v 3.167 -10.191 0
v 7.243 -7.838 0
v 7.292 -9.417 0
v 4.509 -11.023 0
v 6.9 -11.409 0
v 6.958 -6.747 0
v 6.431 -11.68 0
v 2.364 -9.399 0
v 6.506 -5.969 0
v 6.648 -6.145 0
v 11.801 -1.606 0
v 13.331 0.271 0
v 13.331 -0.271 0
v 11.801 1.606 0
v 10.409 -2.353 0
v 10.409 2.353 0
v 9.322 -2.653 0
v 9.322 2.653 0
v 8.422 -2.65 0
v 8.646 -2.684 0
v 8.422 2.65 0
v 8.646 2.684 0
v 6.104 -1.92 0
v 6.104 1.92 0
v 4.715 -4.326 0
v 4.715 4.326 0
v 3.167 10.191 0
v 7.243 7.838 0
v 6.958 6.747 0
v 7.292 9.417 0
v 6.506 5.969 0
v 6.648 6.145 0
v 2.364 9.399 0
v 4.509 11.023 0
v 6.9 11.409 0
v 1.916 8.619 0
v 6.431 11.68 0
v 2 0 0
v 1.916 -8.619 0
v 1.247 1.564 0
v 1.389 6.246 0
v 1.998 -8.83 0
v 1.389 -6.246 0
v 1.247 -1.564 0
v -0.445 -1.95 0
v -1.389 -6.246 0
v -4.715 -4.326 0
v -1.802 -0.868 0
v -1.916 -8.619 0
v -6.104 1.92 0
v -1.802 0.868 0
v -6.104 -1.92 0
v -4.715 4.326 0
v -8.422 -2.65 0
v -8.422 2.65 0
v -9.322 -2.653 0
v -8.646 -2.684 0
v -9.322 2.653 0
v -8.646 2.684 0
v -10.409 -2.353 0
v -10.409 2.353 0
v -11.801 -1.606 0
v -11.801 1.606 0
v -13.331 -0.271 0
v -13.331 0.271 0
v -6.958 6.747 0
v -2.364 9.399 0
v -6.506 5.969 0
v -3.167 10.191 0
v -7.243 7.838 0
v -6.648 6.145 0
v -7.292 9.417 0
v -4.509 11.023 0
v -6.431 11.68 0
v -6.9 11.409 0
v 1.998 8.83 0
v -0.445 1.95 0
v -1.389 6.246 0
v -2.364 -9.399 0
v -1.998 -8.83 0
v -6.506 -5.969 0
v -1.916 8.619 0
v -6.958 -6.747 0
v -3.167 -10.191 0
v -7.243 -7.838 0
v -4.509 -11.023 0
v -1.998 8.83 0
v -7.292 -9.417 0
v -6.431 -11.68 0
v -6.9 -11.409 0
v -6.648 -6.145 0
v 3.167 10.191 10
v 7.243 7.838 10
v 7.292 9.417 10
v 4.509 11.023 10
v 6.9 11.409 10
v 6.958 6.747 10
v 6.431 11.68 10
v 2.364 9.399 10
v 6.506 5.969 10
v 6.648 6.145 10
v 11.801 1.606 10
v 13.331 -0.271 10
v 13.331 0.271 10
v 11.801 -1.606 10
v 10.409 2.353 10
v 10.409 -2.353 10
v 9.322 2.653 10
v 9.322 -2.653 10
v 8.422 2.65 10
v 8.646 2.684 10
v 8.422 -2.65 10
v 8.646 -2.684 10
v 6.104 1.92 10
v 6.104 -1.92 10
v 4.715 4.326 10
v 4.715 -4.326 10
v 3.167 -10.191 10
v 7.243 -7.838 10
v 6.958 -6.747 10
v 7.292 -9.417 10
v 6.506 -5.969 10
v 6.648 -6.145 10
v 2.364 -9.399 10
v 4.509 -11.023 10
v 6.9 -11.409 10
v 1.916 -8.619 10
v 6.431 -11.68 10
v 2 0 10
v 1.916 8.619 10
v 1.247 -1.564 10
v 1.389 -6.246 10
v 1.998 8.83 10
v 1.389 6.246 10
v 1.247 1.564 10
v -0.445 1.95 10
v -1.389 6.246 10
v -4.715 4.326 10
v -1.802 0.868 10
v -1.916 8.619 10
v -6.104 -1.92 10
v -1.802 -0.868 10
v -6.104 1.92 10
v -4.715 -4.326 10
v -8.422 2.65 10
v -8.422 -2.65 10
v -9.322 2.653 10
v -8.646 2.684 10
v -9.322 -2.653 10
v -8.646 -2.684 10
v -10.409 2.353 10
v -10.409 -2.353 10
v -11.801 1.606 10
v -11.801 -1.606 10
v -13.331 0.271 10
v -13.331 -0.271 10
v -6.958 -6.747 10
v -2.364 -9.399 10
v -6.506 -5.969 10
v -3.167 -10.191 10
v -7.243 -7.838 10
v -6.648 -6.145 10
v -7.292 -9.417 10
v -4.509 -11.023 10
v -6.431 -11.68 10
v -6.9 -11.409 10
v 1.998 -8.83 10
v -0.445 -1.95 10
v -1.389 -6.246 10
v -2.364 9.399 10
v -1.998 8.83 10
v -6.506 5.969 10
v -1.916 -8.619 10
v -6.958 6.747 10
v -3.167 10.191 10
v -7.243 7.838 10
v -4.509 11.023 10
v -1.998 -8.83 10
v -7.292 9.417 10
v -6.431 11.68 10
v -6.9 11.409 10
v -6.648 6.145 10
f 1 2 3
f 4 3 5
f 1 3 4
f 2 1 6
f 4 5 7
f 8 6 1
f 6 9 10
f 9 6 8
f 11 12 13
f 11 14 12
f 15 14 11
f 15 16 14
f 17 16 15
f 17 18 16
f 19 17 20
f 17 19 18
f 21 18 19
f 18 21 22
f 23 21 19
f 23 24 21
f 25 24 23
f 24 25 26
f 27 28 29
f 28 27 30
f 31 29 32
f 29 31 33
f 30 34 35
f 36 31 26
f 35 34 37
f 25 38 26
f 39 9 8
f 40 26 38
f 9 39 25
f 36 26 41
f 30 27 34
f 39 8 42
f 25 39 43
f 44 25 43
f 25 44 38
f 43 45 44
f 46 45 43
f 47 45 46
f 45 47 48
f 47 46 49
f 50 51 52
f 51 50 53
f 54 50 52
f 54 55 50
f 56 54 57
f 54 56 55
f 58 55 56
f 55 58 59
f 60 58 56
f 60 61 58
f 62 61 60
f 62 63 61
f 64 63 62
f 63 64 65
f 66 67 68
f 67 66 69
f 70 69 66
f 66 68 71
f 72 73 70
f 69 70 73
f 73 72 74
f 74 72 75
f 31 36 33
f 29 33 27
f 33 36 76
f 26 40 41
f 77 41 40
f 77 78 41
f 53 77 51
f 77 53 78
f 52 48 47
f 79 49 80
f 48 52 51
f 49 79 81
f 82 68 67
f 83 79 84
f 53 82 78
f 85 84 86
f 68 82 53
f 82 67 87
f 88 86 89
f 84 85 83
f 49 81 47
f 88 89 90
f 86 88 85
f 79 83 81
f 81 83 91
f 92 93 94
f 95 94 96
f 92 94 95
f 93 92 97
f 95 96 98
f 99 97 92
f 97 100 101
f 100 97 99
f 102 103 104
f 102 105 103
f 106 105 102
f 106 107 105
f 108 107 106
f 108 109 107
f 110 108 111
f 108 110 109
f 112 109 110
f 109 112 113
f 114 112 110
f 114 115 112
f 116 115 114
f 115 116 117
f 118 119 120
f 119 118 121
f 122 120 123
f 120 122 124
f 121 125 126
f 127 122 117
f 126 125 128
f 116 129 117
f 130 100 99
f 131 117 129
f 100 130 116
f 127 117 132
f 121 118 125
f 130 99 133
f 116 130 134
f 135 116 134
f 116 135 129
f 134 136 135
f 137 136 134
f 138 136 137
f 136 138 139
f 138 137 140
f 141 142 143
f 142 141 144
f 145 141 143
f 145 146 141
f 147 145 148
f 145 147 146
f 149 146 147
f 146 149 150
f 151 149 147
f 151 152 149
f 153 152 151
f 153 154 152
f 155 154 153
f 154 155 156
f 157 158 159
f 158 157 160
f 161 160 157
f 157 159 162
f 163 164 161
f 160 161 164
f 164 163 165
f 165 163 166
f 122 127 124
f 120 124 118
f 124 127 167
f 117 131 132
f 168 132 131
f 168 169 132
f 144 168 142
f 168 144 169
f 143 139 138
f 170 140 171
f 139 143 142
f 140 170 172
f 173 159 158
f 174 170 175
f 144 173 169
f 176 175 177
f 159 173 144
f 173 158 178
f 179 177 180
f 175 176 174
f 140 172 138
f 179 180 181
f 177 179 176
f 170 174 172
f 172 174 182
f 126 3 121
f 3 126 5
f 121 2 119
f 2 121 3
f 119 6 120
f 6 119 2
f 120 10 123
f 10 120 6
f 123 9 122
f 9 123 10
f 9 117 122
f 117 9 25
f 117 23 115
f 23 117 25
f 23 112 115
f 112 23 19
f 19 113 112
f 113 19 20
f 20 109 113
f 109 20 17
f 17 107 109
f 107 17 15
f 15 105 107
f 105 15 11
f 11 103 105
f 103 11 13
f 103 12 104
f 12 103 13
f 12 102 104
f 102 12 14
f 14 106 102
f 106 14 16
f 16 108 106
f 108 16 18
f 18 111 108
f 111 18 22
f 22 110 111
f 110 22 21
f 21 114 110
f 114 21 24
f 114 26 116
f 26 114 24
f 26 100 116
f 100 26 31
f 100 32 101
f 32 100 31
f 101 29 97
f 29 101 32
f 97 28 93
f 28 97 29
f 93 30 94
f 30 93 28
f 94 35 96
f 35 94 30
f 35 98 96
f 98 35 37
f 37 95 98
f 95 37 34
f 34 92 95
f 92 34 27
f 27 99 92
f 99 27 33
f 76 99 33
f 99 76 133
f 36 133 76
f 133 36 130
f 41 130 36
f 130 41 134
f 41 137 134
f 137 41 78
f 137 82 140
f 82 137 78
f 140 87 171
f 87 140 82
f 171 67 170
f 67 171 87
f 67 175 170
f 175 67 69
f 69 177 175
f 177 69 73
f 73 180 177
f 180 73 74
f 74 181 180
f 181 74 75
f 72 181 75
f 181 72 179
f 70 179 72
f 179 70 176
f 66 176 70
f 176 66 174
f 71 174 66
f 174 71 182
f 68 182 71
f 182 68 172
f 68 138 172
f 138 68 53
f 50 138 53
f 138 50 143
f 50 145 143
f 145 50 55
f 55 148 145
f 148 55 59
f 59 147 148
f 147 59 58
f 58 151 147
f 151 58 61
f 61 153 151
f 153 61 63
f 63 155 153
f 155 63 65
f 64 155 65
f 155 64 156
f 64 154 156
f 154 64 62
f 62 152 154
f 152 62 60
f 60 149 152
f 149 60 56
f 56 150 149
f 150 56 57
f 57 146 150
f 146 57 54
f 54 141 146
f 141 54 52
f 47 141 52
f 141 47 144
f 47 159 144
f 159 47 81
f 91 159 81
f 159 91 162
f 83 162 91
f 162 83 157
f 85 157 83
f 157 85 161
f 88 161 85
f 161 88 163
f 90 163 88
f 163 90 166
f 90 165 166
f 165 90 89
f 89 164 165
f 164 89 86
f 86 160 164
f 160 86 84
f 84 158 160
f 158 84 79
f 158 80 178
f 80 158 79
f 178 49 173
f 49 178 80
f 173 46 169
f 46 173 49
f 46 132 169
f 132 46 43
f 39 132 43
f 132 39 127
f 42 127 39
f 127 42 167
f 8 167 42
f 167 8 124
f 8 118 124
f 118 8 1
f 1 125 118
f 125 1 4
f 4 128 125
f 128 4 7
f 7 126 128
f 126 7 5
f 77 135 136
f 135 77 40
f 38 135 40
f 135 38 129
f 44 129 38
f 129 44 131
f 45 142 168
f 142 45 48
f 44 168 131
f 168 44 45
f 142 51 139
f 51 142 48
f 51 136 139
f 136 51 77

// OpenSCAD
// Parametric Involute Bevel and Spur Gears by GregFrost
// It is licensed under the Creative Commons - GNU GPL license.
// © 2010 by GregFrost
// http://www.thingiverse.com/thing:3575

// Simple Test:
//gear (circular_pitch=1000,
//	gear_thickness = 20,
//	rim_thickness = 20,
//	hub_thickness = 20,
//	circles=5);

gear (
	number_of_teeth=6,
	circular_pitch=600, diametral_pitch=false,
	pressure_angle=28,
	clearance = 0.2,
	gear_thickness=10,
	rim_thickness=10,
	rim_width=5,
	hub_thickness=10,
	hub_diameter=15,
	bore_diameter=4,
	circles=0,
	backlash=0,
	twist=0,
	involute_facets=0);

//Complex Spur Gear Test:
//test_gears ();

// Meshing Double Helix:
//meshing_double_helix ();

// Demonstrate the backlash option for Spur gears.
//test_backlash ();

// Demonstrate how to make meshing bevel gears.
//bevel_gear_pair ();

pi=3.1415926535897932384626433832795;

//==================================================
// Bevel Gears:
// Two gears with the same cone distance, circular pitch (measured at the cone distance) 
// and pressure angle will mesh.

module bevel_gear_pair (
	gear1_teeth = 41,
	gear2_teeth = 7,
	axis_angle = 90,
	outside_circular_pitch=1000)
{
	outside_pitch_radius1 = gear1_teeth * outside_circular_pitch / 360;
	outside_pitch_radius2 = gear2_teeth * outside_circular_pitch / 360;
	pitch_apex1=outside_pitch_radius2 * sin (axis_angle) + 
		(outside_pitch_radius2 * cos (axis_angle) + outside_pitch_radius1) / tan (axis_angle);
	cone_distance = sqrt (pow (pitch_apex1, 2) + pow (outside_pitch_radius1, 2));
	pitch_apex2 = sqrt (pow (cone_distance, 2) - pow (outside_pitch_radius2, 2));
	echo ("cone_distance", cone_distance);
	pitch_angle1 = asin (outside_pitch_radius1 / cone_distance);
	pitch_angle2 = asin (outside_pitch_radius2 / cone_distance);
	echo ("pitch_angle1, pitch_angle2", pitch_angle1, pitch_angle2);
	echo ("pitch_angle1 + pitch_angle2", pitch_angle1 + pitch_angle2);

	rotate([0,0,90])
	translate ([0,0,pitch_apex1+20])
	{
		translate([0,0,-pitch_apex1])
		bevel_gear (
			number_of_teeth=gear1_teeth,
			cone_distance=cone_distance,
			pressure_angle=30,
			outside_circular_pitch=outside_circular_pitch);
	
		rotate([0,-(pitch_angle1+pitch_angle2),0])
		translate([0,0,-pitch_apex2])
		bevel_gear (
			number_of_teeth=gear2_teeth,
			cone_distance=cone_distance,
			pressure_angle=30,
			outside_circular_pitch=outside_circular_pitch);
	}
}

//Bevel Gear Finishing Options:
bevel_gear_flat = 0;
bevel_gear_back_cone = 1;

module bevel_gear (
	number_of_teeth=11,
	cone_distance=100,
	face_width=20,
	outside_circular_pitch=1000,
	pressure_angle=30,
	clearance = 0.2,
	bore_diameter=5,
	gear_thickness = 15,
	backlash = 0,
	involute_facets=0,
	finish = -1)
{
	echo ("bevel_gear",
		"teeth", number_of_teeth,
		"cone distance", cone_distance,
		face_width,
		outside_circular_pitch,
		pressure_angle,
		clearance,
		bore_diameter,
		involute_facets,
		finish);

	// Pitch diameter: Diameter of pitch circle at the fat end of the gear.
	outside_pitch_diameter  =  number_of_teeth * outside_circular_pitch / 180;
	outside_pitch_radius = outside_pitch_diameter / 2;

	// The height of the pitch apex.
	pitch_apex = sqrt (pow (cone_distance, 2) - pow (outside_pitch_radius, 2));
	pitch_angle = asin (outside_pitch_radius/cone_distance);

	echo ("Num Teeth:", number_of_teeth, " Pitch Angle:", pitch_angle);

	finish = (finish != -1) ? finish : (pitch_angle < 45) ? bevel_gear_flat : bevel_gear_back_cone;

	apex_to_apex=cone_distance / cos (pitch_angle);
	back_cone_radius = apex_to_apex * sin (pitch_angle);

	// Calculate and display the pitch angle. This is needed to determine the angle to mount two meshing cone gears.

	// Base Circle for forming the involute teeth shape.
	base_radius = back_cone_radius * cos (pressure_angle);	

	// Diametrial pitch: Number of teeth per unit length.
	pitch_diametrial = number_of_teeth / outside_pitch_diameter;

	// Addendum: Radial distance from pitch circle to outside circle.
	addendum = 1 / pitch_diametrial;
	// Outer Circle
	outer_radius = back_cone_radius + addendum;

	// Dedendum: Radial distance from pitch circle to root diameter
	dedendum = addendum + clearance;
	dedendum_angle = atan (dedendum / cone_distance);
	root_angle = pitch_angle - dedendum_angle;

	root_cone_full_radius = tan (root_angle)*apex_to_apex;
	back_cone_full_radius=apex_to_apex / tan (pitch_angle);

	back_cone_end_radius = 
		outside_pitch_radius - 
		dedendum * cos (pitch_angle) - 
		gear_thickness / tan (pitch_angle);
	back_cone_descent = dedendum * sin (pitch_angle) + gear_thickness;

	// Root diameter: Diameter of bottom of tooth spaces.
	root_radius = back_cone_radius - dedendum;

	half_tooth_thickness = outside_pitch_radius * sin (360 / (4 * number_of_teeth)) - backlash / 4;
	half_thick_angle = asin (half_tooth_thickness / back_cone_radius);

	face_cone_height = apex_to_apex-face_width / cos (pitch_angle);
	face_cone_full_radius = face_cone_height / tan (pitch_angle);
	face_cone_descent = dedendum * sin (pitch_angle);
	face_cone_end_radius = 
		outside_pitch_radius -
		face_width / sin (pitch_angle) - 
		face_cone_descent / tan (pitch_angle);

	// For the bevel_gear_flat finish option, calculate the height of a cube to select the portion of the gear that includes the full pitch face.
	bevel_gear_flat_height = pitch_apex - (cone_distance - face_width) * cos (pitch_angle);

//	translate([0,0,-pitch_apex])
	difference ()
	{
		intersection ()
		{
			union()
			{
				rotate (half_thick_angle)
				translate ([0,0,pitch_apex-apex_to_apex])
				cylinder ($fn=number_of_teeth*2, r1=root_cone_full_radius,r2=0,h=apex_to_apex);
				for (i = [1:number_of_teeth])
//				for (i = [1:1])
				{
					rotate ([0,0,i*360/number_of_teeth])
					{
						involute_bevel_gear_tooth (
							back_cone_radius = back_cone_radius,
							root_radius = root_radius,
							base_radius = base_radius,
							outer_radius = outer_radius,
							pitch_apex = pitch_apex,
							cone_distance = cone_distance,
							half_thick_angle = half_thick_angle,
							involute_facets = involute_facets);
					}
				}
			}

			if (finish == bevel_gear_back_cone)
			{
				translate ([0,0,-back_cone_descent])
				cylinder (
					$fn=number_of_teeth*2, 
					r1=back_cone_end_radius,
					r2=back_cone_full_radius*2,
					h=apex_to_apex + back_cone_descent);
			}
			else
			{
				translate ([-1.5*outside_pitch_radius,-1.5*outside_pitch_radius,0])
				cube ([3*outside_pitch_radius,
					3*outside_pitch_radius,
					bevel_gear_flat_height]);
			}
		}
		
		if (finish == bevel_gear_back_cone)
		{
			translate ([0,0,-face_cone_descent])
			cylinder (
				r1=face_cone_end_radius,
				r2=face_cone_full_radius * 2,
				h=face_cone_height + face_cone_descent+pitch_apex);
		}

		translate ([0,0,pitch_apex - apex_to_apex])
		cylinder (r=bore_diameter/2,h=apex_to_apex);
	}	
}

module involute_bevel_gear_tooth (
	back_cone_radius,
	root_radius,
	base_radius,
	outer_radius,
	pitch_apex,
	cone_distance,
	half_thick_angle,
	involute_facets)
{
//	echo ("involute_bevel_gear_tooth",
//		back_cone_radius,
//		root_radius,
//		base_radius,
//		outer_radius,
//		pitch_apex,
//		cone_distance,
//		half_thick_angle);

	min_radius = max (base_radius*2,root_radius*2);

	pitch_point = 
		involute (
			base_radius*2, 
			involute_intersect_angle (base_radius*2, back_cone_radius*2));
	pitch_angle = atan2 (pitch_point[1], pitch_point[0]);
	centre_angle = pitch_angle + half_thick_angle;

	start_angle = involute_intersect_angle (base_radius*2, min_radius);
	stop_angle = involute_intersect_angle (base_radius*2, outer_radius*2);

	res=(involute_facets!=0)?involute_facets:($fn==0)?5:$fn/4;

	translate ([0,0,pitch_apex])
	rotate ([0,-atan(back_cone_radius/cone_distance),0])
	translate ([-back_cone_radius*2,0,-cone_distance*2])
	union ()
	{
		for (i=[1:res])
		{
			assign (
				point1=
					involute (base_radius*2,start_angle+(stop_angle - start_angle)*(i-1)/res),
				point2=
					involute (base_radius*2,start_angle+(stop_angle - start_angle)*(i)/res))
			{
				assign (
					side1_point1 = rotate_point (centre_angle, point1),
					side1_point2 = rotate_point (centre_angle, point2),
					side2_point1 = mirror_point (rotate_point (centre_angle, point1)),
					side2_point2 = mirror_point (rotate_point (centre_angle, point2)))
				{
					polyhedron (
						points=[
							[back_cone_radius*2+0.1,0,cone_distance*2],
							[side1_point1[0],side1_point1[1],0],
							[side1_point2[0],side1_point2[1],0],
							[side2_point2[0],side2_point2[1],0],
							[side2_point1[0],side2_point1[1],0],
							[0.1,0,0]],
						triangles=[[0,1,2],[0,2,3],[0,3,4],[0,5,1],[1,5,2],[2,5,3],[3,5,4],[0,4,5]]);
				}
			}
		}
	}
}

module gear (
	number_of_teeth=15,
	circular_pitch=false, diametral_pitch=false,
	pressure_angle=28,
	clearance = 0.2,
	gear_thickness=5,
	rim_thickness=8,
	rim_width=5,
	hub_thickness=10,
	hub_diameter=15,
	bore_diameter=5,
	circles=0,
	backlash=0,
	twist=0,
	involute_facets=0)
{
	if (circular_pitch==false && diametral_pitch==false) 
		echo("MCAD ERROR: gear module needs either a diametral_pitch or circular_pitch");

	//Convert diametrial pitch to our native circular pitch
	circular_pitch = (circular_pitch!=false?circular_pitch:180/diametral_pitch);

	// Pitch diameter: Diameter of pitch circle.
	pitch_diameter  =  number_of_teeth * circular_pitch / 180;
	pitch_radius = pitch_diameter/2;
	echo ("Teeth:", number_of_teeth, " Pitch radius:", pitch_radius);

	// Base Circle
	base_radius = pitch_radius*cos(pressure_angle);

	// Diametrial pitch: Number of teeth per unit length.
	pitch_diametrial = number_of_teeth / pitch_diameter;

	// Addendum: Radial distance from pitch circle to outside circle.
	addendum = 1/pitch_diametrial;

	//Outer Circle
	outer_radius = pitch_radius+addendum;

	// Dedendum: Radial distance from pitch circle to root diameter
	dedendum = addendum + clearance;

	// Root diameter: Diameter of bottom of tooth spaces.
	root_radius = pitch_radius-dedendum;
	backlash_angle = backlash / pitch_radius * 180 / pi;
	half_thick_angle = (360 / number_of_teeth - backlash_angle) / 4;

	// Variables controlling the rim.
	rim_radius = root_radius - rim_width;

	// Variables controlling the circular holes in the gear.
	circle_orbit_diameter=hub_diameter/2+rim_radius;
	circle_orbit_curcumference=pi*circle_orbit_diameter;

	// Limit the circle size to 90% of the gear face.
	circle_diameter=
		min (
			0.70*circle_orbit_curcumference/circles,
			(rim_radius-hub_diameter/2)*0.9);

	difference ()
	{
		union ()
		{
			difference ()
			{
				linear_extrude (height=rim_thickness, convexity=10, twist=twist)
				gear_shape (
					number_of_teeth,
					pitch_radius = pitch_radius,
					root_radius = root_radius,
					base_radius = base_radius,
					outer_radius = outer_radius,
					half_thick_angle = half_thick_angle,
					involute_facets=involute_facets);

				if (gear_thickness < rim_thickness)
					translate ([0,0,gear_thickness])
					cylinder (r=rim_radius,h=rim_thickness-gear_thickness+1);
			}
			if (gear_thickness > rim_thickness)
				cylinder (r=rim_radius,h=gear_thickness);
			if (hub_thickness > gear_thickness)
				translate ([0,0,gear_thickness])
				cylinder (r=hub_diameter/2,h=hub_thickness-gear_thickness);
		}
		translate ([0,0,-1])
		cylinder (
			r=bore_diameter/2,
			h=2+max(rim_thickness,hub_thickness,gear_thickness));
		if (circles>0)
		{
			for(i=[0:circles-1])	
				rotate([0,0,i*360/circles])
				translate([circle_orbit_diameter/2,0,-1])
				cylinder(r=circle_diameter/2,h=max(gear_thickness,rim_thickness)+3);
		}
	}
}

module gear_shape (
	number_of_teeth,
	pitch_radius,
	root_radius,
	base_radius,
	outer_radius,
	half_thick_angle,
	involute_facets)
{
	union()
	{
		rotate (half_thick_angle) circle ($fn=number_of_teeth*2, r=root_radius);

		for (i = [1:number_of_teeth])
		{
			rotate ([0,0,i*360/number_of_teeth])
			{
				involute_gear_tooth (
					pitch_radius = pitch_radius,
					root_radius = root_radius,
					base_radius = base_radius,
					outer_radius = outer_radius,
					half_thick_angle = half_thick_angle,
					involute_facets=involute_facets);
			}
		}
	}
}

module involute_gear_tooth (
	pitch_radius,
	root_radius,
	base_radius,
	outer_radius,
	half_thick_angle,
	involute_facets)
{
	min_radius = max (base_radius,root_radius);

	pitch_point = involute (base_radius, involute_intersect_angle (base_radius, pitch_radius));
	pitch_angle = atan2 (pitch_point[1], pitch_point[0]);
	centre_angle = pitch_angle + half_thick_angle;

	start_angle = involute_intersect_angle (base_radius, min_radius);
	stop_angle = involute_intersect_angle (base_radius, outer_radius);

	res=(involute_facets!=0)?involute_facets:($fn==0)?5:$fn/4;

	union ()
	{
		for (i=[1:res])
		assign (
			point1=involute (base_radius,start_angle+(stop_angle - start_angle)*(i-1)/res),
			point2=involute (base_radius,start_angle+(stop_angle - start_angle)*i/res))
		{
			assign (
				side1_point1=rotate_point (centre_angle, point1),
				side1_point2=rotate_point (centre_angle, point2),
				side2_point1=mirror_point (rotate_point (centre_angle, point1)),
				side2_point2=mirror_point (rotate_point (centre_angle, point2)))
			{
				polygon (
					points=[[0,0],side1_point1,side1_point2,side2_point2,side2_point1],
					paths=[[0,1,2,3,4,0]]);
			}
		}
	}
}

// Mathematical Functions
//===============

// Finds the angle of the involute about the base radius at the given distance (radius) from it's center.
//source: http://www.mathhelpforum.com/math-help/geometry/136011-circle-involute-solving-y-any-given-x.html

function involute_intersect_angle (base_radius, radius) = sqrt (pow (radius/base_radius, 2) - 1) * 180 / pi;

// Calculate the involute position for a given base radius and involute angle.

function rotated_involute (rotate, base_radius, involute_angle) = 
[
	cos (rotate) * involute (base_radius, involute_angle)[0] + sin (rotate) * involute (base_radius, involute_angle)[1],
	cos (rotate) * involute (base_radius, involute_angle)[1] - sin (rotate) * involute (base_radius, involute_angle)[0]
];

function mirror_point (coord) = 
[
	coord[0], 
	-coord[1]
];

function rotate_point (rotate, coord) =
[
	cos (rotate) * coord[0] + sin (rotate) * coord[1],
	cos (rotate) * coord[1] - sin (rotate) * coord[0]
];

function involute (base_radius, involute_angle) = 
[
	base_radius*(cos (involute_angle) + involute_angle*pi/180*sin (involute_angle)),
	base_radius*(sin (involute_angle) - involute_angle*pi/180*cos (involute_angle)),
];


// Test Cases
//===============

module test_gears()
{
	translate([17,-15])
	{
		gear (number_of_teeth=17,
			circular_pitch=500,
			circles=8);
	
		rotate ([0,0,360*4/17])
		translate ([39.088888,0,0])
		{
			gear (number_of_teeth=11,
				circular_pitch=500,
				hub_diameter=0,
				rim_width=65);
			translate ([0,0,8])
			{
				gear (number_of_teeth=6,
					circular_pitch=300,
					hub_diameter=0,
					rim_width=5,
					rim_thickness=6,
					pressure_angle=31);
				rotate ([0,0,360*5/6])
				translate ([22.5,0,1])
				gear (number_of_teeth=21,
					circular_pitch=300,
					bore_diameter=2,
					hub_diameter=4,
					rim_width=1,
					hub_thickness=4,
					rim_thickness=4,
					gear_thickness=3,
					pressure_angle=31);
			}
		}

		translate ([-61.1111111,0,0])
		{
			gear (number_of_teeth=27,
				circular_pitch=500,
				circles=5,
				hub_diameter=2*8.88888889);

			translate ([0,0,10])
			{
				gear (
					number_of_teeth=14,
					circular_pitch=200,
					pressure_angle=5,
					clearance = 0.2,
					gear_thickness = 10,
					rim_thickness = 10,
					rim_width = 15,
					bore_diameter=5,
					circles=0);
				translate ([13.8888888,0,1])
				gear (
					number_of_teeth=11,
					circular_pitch=200,
					pressure_angle=5,
					clearance = 0.2,
					gear_thickness = 10,
					rim_thickness = 10,
					rim_width = 15,
					hub_thickness = 20,
					hub_diameter=2*7.222222,
					bore_diameter=5,
					circles=0);
			}
		}
	
		rotate ([0,0,360*-5/17])
		translate ([44.444444444,0,0])
		gear (number_of_teeth=15,
			circular_pitch=500,
			hub_diameter=10,
			rim_width=5,
			rim_thickness=5,
			gear_thickness=4,
			hub_thickness=6,
			circles=9);
	
		rotate ([0,0,360*-1/17])
		translate ([30.5555555,0,-1])
		gear (number_of_teeth=5,
			circular_pitch=500,
			hub_diameter=0,
			rim_width=5,
			rim_thickness=10);
	}
}

module meshing_double_helix ()
{
	test_double_helix_gear ();
	
	mirror ([0,1,0])
	translate ([58.33333333,0,0])
	test_double_helix_gear (teeth=13,circles=6);
}

module test_double_helix_gear (
	teeth=17,
	circles=8)
{
	//double helical gear
	{
		twist=200;
		height=20;
		pressure_angle=30;

		gear (number_of_teeth=teeth,
			circular_pitch=700,
			pressure_angle=pressure_angle,
			clearance = 0.2,
			gear_thickness = height/2*0.5,
			rim_thickness = height/2,
			rim_width = 5,
			hub_thickness = height/2*1.2,
			hub_diameter=15,
			bore_diameter=5,
			circles=circles,
			twist=twist/teeth);
		mirror([0,0,1])
		gear (number_of_teeth=teeth,
			circular_pitch=700,
			pressure_angle=pressure_angle,
			clearance = 0.2,
			gear_thickness = height/2,
			rim_thickness = height/2,
			rim_width = 5,
			hub_thickness = height/2,
			hub_diameter=15,
			bore_diameter=5,
			circles=circles,
			twist=twist/teeth);
	}
}

module test_backlash ()
{
	backlash = 2;
	teeth = 15;

	translate ([-29.166666,0,0])
	{
		translate ([58.3333333,0,0])
		rotate ([0,0,-360/teeth/4])
		gear (
			number_of_teeth = teeth,
			circular_pitch=700,
			gear_thickness = 12,
			rim_thickness = 15,
			rim_width = 5,
			hub_thickness = 17,
			hub_diameter=15,
			bore_diameter=5,
			backlash = 2,
			circles=8);
		
		rotate ([0,0,360/teeth/4])
		gear (
			number_of_teeth = teeth,
			circular_pitch=700,
			gear_thickness = 12,
			rim_thickness = 15,
			rim_width = 5,
			hub_thickness = 17,
			hub_diameter=15,
			bore_diameter=5,
			backlash = 2,
			circles=8);
	}

	color([0,0,128,0.5])
	translate([0,0,-5])
	cylinder ($fn=20,r=backlash / 4,h=25);
}
